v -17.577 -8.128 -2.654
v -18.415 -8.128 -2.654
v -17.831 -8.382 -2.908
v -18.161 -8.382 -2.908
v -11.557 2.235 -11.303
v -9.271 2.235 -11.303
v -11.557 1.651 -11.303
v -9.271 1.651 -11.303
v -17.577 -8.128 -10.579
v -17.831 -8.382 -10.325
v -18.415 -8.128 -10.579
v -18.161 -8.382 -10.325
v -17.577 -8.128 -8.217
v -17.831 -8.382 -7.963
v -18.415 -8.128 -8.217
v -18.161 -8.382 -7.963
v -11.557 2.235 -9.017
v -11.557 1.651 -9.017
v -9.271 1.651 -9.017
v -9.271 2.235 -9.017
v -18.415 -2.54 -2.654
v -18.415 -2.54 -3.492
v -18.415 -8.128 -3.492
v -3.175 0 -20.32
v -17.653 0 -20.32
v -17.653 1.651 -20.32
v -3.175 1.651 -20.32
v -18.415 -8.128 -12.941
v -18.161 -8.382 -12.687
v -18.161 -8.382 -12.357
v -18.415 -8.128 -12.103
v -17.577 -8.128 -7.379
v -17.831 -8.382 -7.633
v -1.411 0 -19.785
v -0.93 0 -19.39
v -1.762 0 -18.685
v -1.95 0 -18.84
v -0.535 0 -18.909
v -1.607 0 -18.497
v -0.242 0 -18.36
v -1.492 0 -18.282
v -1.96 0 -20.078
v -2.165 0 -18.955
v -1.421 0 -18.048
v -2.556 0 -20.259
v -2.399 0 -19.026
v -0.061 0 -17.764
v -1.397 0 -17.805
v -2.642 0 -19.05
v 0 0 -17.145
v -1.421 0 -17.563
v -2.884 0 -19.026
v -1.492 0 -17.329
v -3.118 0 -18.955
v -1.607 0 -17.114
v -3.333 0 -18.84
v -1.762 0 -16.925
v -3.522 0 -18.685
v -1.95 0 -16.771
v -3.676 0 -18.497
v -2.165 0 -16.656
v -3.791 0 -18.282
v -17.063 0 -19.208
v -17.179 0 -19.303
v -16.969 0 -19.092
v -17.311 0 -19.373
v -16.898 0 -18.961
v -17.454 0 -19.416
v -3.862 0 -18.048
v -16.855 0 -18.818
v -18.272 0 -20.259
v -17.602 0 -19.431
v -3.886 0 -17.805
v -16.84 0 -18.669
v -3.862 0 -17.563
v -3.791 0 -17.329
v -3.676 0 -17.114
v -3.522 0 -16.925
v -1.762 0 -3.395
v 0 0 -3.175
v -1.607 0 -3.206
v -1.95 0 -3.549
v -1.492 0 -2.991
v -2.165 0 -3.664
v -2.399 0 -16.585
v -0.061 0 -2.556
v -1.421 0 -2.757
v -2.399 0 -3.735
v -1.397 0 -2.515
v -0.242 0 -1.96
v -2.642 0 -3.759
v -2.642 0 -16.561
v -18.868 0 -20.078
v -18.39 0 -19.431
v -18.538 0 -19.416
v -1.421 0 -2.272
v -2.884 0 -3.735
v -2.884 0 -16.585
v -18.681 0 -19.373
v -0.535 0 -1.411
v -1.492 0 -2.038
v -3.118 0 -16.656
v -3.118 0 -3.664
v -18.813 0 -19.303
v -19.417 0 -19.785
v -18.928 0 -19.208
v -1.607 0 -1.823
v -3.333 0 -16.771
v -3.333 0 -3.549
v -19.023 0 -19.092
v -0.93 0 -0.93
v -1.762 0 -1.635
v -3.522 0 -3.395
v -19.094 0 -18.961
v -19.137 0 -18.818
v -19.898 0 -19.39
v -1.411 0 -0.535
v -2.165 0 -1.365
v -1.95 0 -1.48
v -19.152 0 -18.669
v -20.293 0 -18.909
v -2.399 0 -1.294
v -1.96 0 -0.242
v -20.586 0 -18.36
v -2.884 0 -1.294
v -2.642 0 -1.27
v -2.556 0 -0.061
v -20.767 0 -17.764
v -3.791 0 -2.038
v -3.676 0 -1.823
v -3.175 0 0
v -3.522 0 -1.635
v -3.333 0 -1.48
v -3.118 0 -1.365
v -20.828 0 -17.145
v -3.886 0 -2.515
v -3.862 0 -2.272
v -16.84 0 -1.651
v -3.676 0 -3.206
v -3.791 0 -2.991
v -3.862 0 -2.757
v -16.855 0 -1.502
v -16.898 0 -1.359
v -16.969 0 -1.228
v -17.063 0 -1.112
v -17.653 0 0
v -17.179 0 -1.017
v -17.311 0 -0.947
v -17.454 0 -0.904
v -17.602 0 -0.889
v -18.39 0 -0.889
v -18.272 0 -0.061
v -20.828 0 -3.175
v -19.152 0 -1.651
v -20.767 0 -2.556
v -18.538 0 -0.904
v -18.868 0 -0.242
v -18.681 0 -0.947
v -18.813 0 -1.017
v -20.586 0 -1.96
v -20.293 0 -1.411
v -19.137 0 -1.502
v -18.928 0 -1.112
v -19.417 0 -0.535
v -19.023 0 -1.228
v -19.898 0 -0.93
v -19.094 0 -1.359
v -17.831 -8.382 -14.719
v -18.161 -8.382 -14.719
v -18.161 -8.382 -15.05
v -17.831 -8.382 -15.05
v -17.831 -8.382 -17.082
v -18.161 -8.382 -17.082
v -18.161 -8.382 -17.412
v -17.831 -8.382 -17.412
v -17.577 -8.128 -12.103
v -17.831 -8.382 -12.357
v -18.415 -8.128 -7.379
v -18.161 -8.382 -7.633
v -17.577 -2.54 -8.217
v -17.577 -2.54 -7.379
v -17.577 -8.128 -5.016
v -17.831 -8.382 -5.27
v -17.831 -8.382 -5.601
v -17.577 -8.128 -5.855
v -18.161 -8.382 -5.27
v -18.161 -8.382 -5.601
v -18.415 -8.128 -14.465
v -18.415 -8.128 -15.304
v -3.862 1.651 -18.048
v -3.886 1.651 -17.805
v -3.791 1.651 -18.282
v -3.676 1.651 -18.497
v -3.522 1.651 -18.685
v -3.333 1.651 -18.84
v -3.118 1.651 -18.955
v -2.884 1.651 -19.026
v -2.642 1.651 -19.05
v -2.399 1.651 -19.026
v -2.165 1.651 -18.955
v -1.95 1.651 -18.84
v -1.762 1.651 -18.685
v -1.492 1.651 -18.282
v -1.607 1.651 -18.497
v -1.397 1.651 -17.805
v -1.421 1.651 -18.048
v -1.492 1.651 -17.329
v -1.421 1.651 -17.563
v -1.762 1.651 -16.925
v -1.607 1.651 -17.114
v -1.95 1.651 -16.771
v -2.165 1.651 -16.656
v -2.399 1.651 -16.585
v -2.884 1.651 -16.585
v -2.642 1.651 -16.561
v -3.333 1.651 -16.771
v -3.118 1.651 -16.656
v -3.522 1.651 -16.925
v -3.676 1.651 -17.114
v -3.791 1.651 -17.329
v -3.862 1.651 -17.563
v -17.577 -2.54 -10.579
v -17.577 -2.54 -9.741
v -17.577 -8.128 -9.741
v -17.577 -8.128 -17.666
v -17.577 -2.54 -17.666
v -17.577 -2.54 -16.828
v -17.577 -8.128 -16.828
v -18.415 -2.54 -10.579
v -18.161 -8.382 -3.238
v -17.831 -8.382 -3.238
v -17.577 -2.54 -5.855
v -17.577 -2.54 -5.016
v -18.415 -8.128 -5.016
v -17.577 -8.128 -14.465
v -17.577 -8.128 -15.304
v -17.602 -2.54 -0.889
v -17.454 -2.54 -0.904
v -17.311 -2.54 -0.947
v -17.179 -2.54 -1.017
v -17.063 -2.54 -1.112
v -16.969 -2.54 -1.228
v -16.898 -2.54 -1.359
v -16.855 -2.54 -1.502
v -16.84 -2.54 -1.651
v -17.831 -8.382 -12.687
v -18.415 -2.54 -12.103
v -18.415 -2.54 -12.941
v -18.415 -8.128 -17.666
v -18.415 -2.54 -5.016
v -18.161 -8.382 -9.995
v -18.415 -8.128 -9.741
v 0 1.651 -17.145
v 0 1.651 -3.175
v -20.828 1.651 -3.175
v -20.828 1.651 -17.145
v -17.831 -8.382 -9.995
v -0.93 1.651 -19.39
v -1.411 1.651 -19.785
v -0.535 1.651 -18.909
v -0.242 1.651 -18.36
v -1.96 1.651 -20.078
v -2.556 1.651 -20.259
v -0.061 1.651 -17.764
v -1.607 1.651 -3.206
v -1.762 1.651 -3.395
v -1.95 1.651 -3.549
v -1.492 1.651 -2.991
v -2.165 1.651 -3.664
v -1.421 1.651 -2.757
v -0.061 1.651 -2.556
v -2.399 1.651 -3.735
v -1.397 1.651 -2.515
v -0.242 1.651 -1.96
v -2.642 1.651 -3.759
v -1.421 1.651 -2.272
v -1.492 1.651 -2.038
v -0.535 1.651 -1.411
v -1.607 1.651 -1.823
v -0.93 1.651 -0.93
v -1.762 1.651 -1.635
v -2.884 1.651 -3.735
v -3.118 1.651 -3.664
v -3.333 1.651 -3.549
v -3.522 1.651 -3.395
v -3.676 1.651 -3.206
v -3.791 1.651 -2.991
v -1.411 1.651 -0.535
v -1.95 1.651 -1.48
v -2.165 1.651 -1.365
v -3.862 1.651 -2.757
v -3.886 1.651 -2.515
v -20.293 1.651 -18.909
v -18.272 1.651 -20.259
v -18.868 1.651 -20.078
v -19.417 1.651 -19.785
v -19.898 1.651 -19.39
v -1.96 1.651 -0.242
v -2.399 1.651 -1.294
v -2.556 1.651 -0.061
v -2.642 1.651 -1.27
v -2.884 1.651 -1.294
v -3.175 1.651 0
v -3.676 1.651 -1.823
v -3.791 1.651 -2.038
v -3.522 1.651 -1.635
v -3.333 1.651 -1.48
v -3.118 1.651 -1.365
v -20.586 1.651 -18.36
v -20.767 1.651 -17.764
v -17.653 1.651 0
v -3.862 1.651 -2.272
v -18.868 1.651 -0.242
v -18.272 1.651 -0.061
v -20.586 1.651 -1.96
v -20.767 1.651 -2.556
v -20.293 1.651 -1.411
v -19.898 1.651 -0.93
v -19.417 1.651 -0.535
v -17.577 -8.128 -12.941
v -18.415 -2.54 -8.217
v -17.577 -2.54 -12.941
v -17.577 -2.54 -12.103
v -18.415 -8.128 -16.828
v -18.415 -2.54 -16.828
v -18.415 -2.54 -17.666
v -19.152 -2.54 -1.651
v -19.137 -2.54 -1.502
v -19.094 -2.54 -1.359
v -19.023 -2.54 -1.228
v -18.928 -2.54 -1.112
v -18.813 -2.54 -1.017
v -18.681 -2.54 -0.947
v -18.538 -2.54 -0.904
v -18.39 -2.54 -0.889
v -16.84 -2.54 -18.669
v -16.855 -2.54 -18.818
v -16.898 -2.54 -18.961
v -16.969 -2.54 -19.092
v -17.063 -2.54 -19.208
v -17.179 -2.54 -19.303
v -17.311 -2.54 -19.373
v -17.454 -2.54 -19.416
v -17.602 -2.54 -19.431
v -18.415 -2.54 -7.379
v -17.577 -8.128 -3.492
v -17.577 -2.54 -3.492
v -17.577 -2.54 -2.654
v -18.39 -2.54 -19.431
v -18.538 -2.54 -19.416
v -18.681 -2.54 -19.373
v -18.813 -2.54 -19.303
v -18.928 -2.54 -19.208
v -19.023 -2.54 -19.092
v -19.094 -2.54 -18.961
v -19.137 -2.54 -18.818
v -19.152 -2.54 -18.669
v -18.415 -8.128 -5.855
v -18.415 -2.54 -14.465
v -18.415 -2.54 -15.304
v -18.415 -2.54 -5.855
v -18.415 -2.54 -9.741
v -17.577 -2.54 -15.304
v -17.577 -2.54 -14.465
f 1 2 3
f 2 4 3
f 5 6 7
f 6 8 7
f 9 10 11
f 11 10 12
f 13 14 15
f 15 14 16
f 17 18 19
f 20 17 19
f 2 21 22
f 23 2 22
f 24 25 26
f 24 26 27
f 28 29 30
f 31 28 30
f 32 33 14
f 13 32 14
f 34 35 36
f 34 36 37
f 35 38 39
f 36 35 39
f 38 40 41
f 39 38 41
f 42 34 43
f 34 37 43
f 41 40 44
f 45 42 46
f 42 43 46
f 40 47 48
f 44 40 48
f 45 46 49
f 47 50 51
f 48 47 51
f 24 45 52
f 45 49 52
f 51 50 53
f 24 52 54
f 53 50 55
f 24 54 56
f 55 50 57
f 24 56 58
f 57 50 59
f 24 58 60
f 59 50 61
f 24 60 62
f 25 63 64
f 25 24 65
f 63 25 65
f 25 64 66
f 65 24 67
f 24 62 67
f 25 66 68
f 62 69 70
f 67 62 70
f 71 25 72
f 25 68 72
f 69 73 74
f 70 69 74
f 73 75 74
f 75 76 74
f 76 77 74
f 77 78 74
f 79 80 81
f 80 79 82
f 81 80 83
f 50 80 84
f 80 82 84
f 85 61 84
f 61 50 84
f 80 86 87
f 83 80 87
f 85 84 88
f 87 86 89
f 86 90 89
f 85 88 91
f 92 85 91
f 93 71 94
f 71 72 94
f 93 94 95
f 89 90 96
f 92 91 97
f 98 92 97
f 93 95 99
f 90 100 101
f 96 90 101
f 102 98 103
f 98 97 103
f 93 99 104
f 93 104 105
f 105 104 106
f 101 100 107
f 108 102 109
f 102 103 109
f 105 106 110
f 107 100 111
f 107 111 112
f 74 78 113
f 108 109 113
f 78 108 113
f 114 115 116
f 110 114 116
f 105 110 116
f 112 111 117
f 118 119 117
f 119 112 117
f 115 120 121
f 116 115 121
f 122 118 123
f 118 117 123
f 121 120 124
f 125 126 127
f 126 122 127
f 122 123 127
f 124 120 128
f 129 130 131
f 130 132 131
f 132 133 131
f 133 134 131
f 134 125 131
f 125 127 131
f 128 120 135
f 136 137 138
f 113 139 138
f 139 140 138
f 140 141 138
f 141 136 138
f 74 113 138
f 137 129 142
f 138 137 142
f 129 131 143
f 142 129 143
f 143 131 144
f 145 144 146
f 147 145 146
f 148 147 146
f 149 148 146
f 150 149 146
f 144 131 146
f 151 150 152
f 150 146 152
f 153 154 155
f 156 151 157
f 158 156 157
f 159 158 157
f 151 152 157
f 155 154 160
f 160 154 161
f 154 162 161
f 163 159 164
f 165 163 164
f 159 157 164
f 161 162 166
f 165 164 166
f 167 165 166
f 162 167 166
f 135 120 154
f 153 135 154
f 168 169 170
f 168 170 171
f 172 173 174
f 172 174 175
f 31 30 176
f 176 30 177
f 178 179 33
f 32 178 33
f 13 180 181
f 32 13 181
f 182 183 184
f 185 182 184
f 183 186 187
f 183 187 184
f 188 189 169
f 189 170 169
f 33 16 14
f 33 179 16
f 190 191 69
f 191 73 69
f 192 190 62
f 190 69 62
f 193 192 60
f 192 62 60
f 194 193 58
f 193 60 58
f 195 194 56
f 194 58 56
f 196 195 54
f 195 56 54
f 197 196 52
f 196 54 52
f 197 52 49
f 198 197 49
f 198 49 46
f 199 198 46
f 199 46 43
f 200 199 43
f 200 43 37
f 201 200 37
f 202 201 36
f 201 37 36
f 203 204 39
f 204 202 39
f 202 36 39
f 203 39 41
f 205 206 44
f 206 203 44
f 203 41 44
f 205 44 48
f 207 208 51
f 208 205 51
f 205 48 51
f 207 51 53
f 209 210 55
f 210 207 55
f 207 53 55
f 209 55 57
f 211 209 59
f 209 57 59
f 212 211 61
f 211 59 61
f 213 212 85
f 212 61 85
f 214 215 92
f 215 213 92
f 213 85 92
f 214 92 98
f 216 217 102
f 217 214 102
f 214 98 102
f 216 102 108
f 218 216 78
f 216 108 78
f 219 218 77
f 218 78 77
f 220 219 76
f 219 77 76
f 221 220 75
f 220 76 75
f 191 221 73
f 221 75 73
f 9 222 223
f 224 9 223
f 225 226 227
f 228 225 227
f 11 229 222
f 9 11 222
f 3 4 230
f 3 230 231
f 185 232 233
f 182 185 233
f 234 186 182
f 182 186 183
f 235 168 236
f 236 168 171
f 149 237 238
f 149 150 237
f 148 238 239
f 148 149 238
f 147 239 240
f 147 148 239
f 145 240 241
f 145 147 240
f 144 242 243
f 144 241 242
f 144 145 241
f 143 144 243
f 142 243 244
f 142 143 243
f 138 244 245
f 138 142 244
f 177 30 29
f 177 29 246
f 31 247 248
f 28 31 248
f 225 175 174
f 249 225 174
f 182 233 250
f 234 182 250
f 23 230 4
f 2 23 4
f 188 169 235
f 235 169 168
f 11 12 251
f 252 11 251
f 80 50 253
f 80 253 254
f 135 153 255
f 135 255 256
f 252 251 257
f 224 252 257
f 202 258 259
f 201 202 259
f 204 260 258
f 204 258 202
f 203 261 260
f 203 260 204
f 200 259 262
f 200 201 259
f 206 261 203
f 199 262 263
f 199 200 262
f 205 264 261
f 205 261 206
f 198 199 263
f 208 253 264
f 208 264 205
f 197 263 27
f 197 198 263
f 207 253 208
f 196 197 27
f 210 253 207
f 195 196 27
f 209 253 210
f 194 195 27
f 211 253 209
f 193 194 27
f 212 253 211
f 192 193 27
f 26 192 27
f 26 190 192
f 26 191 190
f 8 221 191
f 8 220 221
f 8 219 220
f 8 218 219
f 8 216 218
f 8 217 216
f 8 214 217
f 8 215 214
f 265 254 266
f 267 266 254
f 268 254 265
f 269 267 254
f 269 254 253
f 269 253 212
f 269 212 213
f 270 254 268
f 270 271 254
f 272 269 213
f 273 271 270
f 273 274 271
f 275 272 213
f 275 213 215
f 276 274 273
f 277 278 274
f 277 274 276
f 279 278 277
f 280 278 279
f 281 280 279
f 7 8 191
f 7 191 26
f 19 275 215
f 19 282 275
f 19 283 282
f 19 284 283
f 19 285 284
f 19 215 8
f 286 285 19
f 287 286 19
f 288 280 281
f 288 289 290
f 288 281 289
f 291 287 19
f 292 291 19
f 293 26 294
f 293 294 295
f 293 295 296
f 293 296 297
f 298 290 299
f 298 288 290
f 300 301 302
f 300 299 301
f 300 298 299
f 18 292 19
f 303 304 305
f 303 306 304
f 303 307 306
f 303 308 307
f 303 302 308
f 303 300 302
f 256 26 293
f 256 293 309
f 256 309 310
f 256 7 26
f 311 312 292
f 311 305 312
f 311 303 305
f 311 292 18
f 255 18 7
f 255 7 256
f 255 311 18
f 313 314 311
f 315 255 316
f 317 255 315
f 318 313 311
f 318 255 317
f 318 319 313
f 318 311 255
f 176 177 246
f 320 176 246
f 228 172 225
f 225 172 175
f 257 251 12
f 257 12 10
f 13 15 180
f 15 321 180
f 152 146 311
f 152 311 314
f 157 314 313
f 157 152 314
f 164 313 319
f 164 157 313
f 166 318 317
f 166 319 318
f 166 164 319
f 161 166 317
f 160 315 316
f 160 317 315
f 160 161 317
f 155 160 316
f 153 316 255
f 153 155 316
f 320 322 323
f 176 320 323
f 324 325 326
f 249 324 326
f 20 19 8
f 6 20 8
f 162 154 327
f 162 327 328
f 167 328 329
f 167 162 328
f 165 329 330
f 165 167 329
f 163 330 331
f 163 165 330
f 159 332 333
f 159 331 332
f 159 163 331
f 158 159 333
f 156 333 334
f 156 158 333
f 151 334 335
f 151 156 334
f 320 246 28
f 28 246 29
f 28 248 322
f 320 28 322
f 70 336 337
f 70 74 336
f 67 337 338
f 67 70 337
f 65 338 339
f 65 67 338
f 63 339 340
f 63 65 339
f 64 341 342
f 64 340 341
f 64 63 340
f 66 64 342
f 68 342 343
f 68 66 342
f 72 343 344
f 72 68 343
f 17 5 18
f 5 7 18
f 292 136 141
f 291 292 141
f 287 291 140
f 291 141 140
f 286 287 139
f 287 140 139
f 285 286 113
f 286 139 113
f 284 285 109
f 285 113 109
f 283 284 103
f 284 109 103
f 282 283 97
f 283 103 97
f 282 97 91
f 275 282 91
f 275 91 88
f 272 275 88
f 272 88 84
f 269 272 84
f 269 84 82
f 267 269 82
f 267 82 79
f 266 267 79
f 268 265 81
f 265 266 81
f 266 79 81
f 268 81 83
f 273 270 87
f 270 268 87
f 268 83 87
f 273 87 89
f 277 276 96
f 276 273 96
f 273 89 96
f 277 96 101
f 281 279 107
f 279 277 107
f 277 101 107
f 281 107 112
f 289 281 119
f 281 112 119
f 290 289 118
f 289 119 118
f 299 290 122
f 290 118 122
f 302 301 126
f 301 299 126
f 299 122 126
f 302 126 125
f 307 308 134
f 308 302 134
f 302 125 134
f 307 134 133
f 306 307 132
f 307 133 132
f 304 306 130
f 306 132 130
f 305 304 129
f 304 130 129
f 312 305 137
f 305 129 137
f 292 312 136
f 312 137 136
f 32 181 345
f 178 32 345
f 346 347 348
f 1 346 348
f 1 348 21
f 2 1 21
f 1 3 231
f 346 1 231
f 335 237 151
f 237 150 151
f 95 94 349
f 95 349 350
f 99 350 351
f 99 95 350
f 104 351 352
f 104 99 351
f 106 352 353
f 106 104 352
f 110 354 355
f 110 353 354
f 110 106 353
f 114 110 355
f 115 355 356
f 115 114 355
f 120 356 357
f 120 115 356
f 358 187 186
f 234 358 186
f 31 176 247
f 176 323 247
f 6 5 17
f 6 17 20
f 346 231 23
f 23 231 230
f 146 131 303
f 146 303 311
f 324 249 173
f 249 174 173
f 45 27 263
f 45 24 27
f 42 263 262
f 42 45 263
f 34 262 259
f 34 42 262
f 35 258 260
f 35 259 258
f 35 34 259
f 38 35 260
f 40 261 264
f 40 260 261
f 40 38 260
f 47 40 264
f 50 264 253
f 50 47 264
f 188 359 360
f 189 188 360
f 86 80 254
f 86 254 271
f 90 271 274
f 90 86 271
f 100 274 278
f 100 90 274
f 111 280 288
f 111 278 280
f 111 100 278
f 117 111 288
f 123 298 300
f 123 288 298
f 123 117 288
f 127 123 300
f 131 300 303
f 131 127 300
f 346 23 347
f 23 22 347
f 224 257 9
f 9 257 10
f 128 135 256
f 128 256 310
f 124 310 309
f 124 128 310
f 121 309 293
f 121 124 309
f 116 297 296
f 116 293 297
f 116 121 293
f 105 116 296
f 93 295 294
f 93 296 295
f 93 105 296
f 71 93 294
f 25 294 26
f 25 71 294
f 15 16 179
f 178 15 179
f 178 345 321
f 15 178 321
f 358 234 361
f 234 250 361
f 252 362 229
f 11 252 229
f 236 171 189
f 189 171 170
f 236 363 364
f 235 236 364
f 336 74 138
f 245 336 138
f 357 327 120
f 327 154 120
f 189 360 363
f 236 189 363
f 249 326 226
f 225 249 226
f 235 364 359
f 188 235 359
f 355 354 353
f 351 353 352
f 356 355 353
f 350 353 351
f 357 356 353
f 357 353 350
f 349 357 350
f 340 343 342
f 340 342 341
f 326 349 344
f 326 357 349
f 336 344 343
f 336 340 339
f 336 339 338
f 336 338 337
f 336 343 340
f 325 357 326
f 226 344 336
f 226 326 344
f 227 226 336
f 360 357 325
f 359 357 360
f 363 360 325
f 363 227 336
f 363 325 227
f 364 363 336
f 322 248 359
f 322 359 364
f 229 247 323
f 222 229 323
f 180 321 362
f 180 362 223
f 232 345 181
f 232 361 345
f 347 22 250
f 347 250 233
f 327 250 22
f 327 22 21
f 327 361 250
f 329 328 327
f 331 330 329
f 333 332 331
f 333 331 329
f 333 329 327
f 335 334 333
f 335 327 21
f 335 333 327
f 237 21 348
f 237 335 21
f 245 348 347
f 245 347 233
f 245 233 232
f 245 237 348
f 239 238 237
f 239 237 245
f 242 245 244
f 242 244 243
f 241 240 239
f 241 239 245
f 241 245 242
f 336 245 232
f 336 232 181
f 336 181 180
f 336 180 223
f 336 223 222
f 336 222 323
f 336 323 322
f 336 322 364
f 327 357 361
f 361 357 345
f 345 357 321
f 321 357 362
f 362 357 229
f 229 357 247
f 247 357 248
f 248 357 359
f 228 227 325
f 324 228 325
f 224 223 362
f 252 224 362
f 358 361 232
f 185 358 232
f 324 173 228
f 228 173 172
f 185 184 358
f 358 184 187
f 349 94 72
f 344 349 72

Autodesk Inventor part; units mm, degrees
ref_plane "YZ Plane" through (0, 0, 0) normal (1, 0, 0) x (0, 1, 0)
ref_plane "XZ Plane" through (0, 0, 0) normal (0, 1, 0) x (-1, 0, 0)
ref_plane "XY Plane" through (0, 0, 0) normal (0, 0, 1) x (1, 0, 0)
sketch "Sketch1" plane through (0, 0, 0) normal (0, 1, 0) x (-1, 0, 0)
  line L0 (3.175, 0) -> (17.653, 0)
  line L1 (20.828, -3.175) -> (20.828, -17.145)
  line L2 (17.653, -20.32) -> (3.175, -20.32)
  line L3 (0, -17.145) -> (0, -3.175)
  circle A0 centre (2.6416, -2.5146) radius 1.2446
  circle A1 centre (2.6416, -17.8054) radius 1.2446
  line L4 (1.397, -2.5146) -> (0, -2.5146) construction
  line L5 (2.6416, -1.27) -> (2.6416, 0) construction
  line L6 (1.397, -17.8054) -> (0, -17.8054) construction
  line L7 (2.6416, -19.05) -> (2.6416, -20.32) construction
  arc A2 (0, -17.145) -> (3.175, -20.32) centre (3.175, -17.145) ccw
  arc A3 (3.175, 0) -> (0, -3.175) centre (3.175, -3.175) ccw
  arc A4 (20.828, -3.175) -> (17.653, 0) centre (17.653, -3.175) ccw
  arc A5 (17.653, -20.32) -> (20.828, -17.145) centre (17.653, -17.145) ccw
  point P0 (0, 0)
  point P1 (20.828, -20.32)
  point P2 (20.828, 0)
  point P3 (0, -20.32)
  dimension "d0" = 20.32
  dimension "d1" = 20.828
  dimension "d2" = 2.4892
  dimension "d3" = 2.4892
  dimension "d4" = 1.397
  dimension "d5" = 1.27
  dimension "d6" = 1.27
  dimension "d7" = 1.397
  dimension "d8" = 3.175
extrude "Extrusion1" add sketch "Sketch1" along normal blind 1.651
sketch "Sketch2" plane through (0, 1.651, 0) normal (0, 1, 0) x (1, 0, 0)
  line L0 (-11.557, 9.017) -> (-9.271, 9.017)
  line L1 (-9.271, 9.017) -> (-9.271, 11.303)
  line L2 (-9.271, 11.303) -> (-11.557, 11.303)
  line L3 (-11.557, 11.303) -> (-11.557, 9.017)
  line L4 (-11.557, 10.16) -> (-9.271, 10.16) construction
  line L5 (-10.414, 9.017) -> (-10.414, 11.303) construction
  line L6 (-3.175, 20.32) -> (-17.653, 20.32) projected
  line L7 (-20.828, 17.145) -> (-20.828, 3.175) projected
  point P0 (0, 0)
  point P1 (-10.414, 20.32)
  point P2 (-20.828, 10.16)
  dimension "d11" = 2.286
  dimension "d12" = 2.286
extrude "Extrusion2" add sketch "Sketch2" along normal blind 0.5842
sketch "Sketch3" plane through (0, 0, 0) normal (0, -1, 0) x (1, 0, 0)
  line L0 (-18.3896, -19.431) -> (-17.6022, -19.431)
  line L1 (-16.8402, -18.669) -> (-16.8402, -1.651)
  line L2 (-17.6022, -0.889) -> (-18.3896, -0.889)
  line L3 (-19.1516, -1.651) -> (-19.1516, -18.669)
  line L4 (-17.653, -20.32) -> (-3.175, -20.32) projected
  line L5 (-3.175, 0) -> (-17.653, 0) projected
  line L6 (-20.828, -3.175) -> (-20.828, -17.145) projected
  arc A0 (-19.1516, -18.669) -> (-18.3896, -19.431) centre (-18.3896, -18.669) ccw
  arc A1 (-18.3896, -0.889) -> (-19.1516, -1.651) centre (-18.3896, -1.651) ccw
  arc A2 (-16.8402, -1.651) -> (-17.6022, -0.889) centre (-17.6022, -1.651) ccw
  arc A3 (-17.6022, -19.431) -> (-16.8402, -18.669) centre (-17.6022, -18.669) ccw
  point P0 (0, 0)
  dimension "d15" = 0.889
  dimension "d16" = 0.889
  dimension "d17" = 3.9878
  dimension "d18" = 1.6764
  dimension "d19" = 0.762
extrude "Extrusion3" add sketch "Sketch3" along normal blind 2.54
sketch "Sketch4" plane through (0, -2.54, 0) normal (0, -1, 0) x (1, 0, 0)
  line L0 (-18.415, -17.6657) -> (-17.5768, -17.6657)
  line L1 (-17.5768, -17.6657) -> (-17.5768, -16.8275)
  line L2 (-17.5768, -16.8275) -> (-18.415, -16.8275)
  line L3 (-18.415, -16.8275) -> (-18.415, -17.6657)
  line L4 (-17.9959, -17.6657) -> (-17.9959, -16.8275) construction
  line L5 (-18.3896, -19.431) -> (-17.6022, -19.431) projected
  line L6 (-18.415, -15.3035) -> (-17.5768, -15.3035)
  line L7 (-17.5768, -15.3035) -> (-17.5768, -14.4653)
  line L8 (-17.5768, -14.4653) -> (-18.415, -14.4653)
  line L9 (-18.415, -14.4653) -> (-18.415, -15.3035)
  line L10 (-17.9959, -15.3035) -> (-17.9959, -14.4653) construction
  line L11 (-18.415, -12.9413) -> (-17.5768, -12.9413)
  line L12 (-17.5768, -12.9413) -> (-17.5768, -12.1031)
  line L13 (-17.5768, -12.1031) -> (-18.415, -12.1031)
  line L14 (-18.415, -12.1031) -> (-18.415, -12.9413)
  line L15 (-17.9959, -12.9413) -> (-17.9959, -12.1031) construction
  line L16 (-18.415, -10.5791) -> (-17.5768, -10.5791)
  line L17 (-17.5768, -10.5791) -> (-17.5768, -9.7409)
  line L18 (-17.5768, -9.7409) -> (-18.415, -9.7409)
  line L19 (-18.415, -9.7409) -> (-18.415, -10.5791)
  line L20 (-17.9959, -10.5791) -> (-17.9959, -9.7409) construction
  line L21 (-18.415, -8.2169) -> (-17.5768, -8.2169)
  line L22 (-17.5768, -8.2169) -> (-17.5768, -7.3787)
  line L23 (-17.5768, -7.3787) -> (-18.415, -7.3787)
  line L24 (-18.415, -7.3787) -> (-18.415, -8.2169)
  line L25 (-17.9959, -8.2169) -> (-17.9959, -7.3787) construction
  line L26 (-18.415, -5.8547) -> (-17.5768, -5.8547)
  line L27 (-17.5768, -5.8547) -> (-17.5768, -5.0165)
  line L28 (-17.5768, -5.0165) -> (-18.415, -5.0165)
  line L29 (-18.415, -5.0165) -> (-18.415, -5.8547)
  line L30 (-17.9959, -5.8547) -> (-17.9959, -5.0165) construction
  line L31 (-18.415, -3.4925) -> (-17.5768, -3.4925)
  line L32 (-17.5768, -3.4925) -> (-17.5768, -2.6543)
  line L33 (-17.5768, -2.6543) -> (-18.415, -2.6543)
  line L34 (-18.415, -2.6543) -> (-18.415, -3.4925)
  line L35 (-17.9959, -3.4925) -> (-17.9959, -2.6543) construction
  line L36 (-18.415, -10.16) -> (-17.5768, -10.16) construction
  line L37 (-19.1516, -1.651) -> (-19.1516, -18.669) projected
  point P0 (0, 0)
  point P1 (-17.9959, -19.431)
  point P2 (-17.9959, -17.0688)
  point P3 (-17.9959, -14.7066)
  point P4 (-17.9959, -12.3444)
  point P5 (-17.9959, -9.9822)
  point P6 (-17.9959, -7.62)
  point P7 (-17.9959, -5.2578)
  point P8 (-19.1516, -10.16)
  dimension "d22" = 0.8382
  dimension "d23" = 0.8382
  dimension "d26" = 2.3622
extrude "Extrusion4" add sketch "Sketch4" along normal blind 5.842
chamfer "Chamfer1" distance 0.254 angle 45 28 edges at (-18.415, -8.382, -17.2466) (-17.9959, -8.382, -17.6657) (-17.5768, -8.382, -17.2466) (-17.9959, -8.382, -16.8275) (-18.415, -8.382, -14.8844) (-17.9959, -8.382, -15.3035) (-17.5768, -8.382, -14.8844) (-17.9959, -8.382, -14.4653) (-17.9959, -8.382, -12.9413) (-18.415, -8.382, -12.5222) (-17.9959, -8.382, -12.1031) (-17.5768, -8.382, -12.5222) (-17.5768, -8.382, -10.16) (-17.9959, -8.382, -9.7409) (-18.415, -8.382, -10.16) (-17.9959, -8.382, -10.5791) (-17.9959, -8.382, -8.2169) (-18.415, -8.382, -7.7978) (-17.9959, -8.382, -7.3787) (-17.5768, -8.382, -7.7978) (-18.415, -8.382, -5.4356) (-17.9959, -8.382, -5.0165) (-17.5768, -8.382, -5.4356) (-17.9959, -8.382, -5.8547) (-17.9959, -8.382, -3.4925) (-18.415, -8.382, -3.0734) (-17.9959, -8.382, -2.6543) (-17.5768, -8.382, -3.0734)
equation "\"d3\" = d2"
equation "\"d6\" = d5"
equation "\"d7\" = d4"
properties part number "Adafruit TMP007 IR Sensor"
